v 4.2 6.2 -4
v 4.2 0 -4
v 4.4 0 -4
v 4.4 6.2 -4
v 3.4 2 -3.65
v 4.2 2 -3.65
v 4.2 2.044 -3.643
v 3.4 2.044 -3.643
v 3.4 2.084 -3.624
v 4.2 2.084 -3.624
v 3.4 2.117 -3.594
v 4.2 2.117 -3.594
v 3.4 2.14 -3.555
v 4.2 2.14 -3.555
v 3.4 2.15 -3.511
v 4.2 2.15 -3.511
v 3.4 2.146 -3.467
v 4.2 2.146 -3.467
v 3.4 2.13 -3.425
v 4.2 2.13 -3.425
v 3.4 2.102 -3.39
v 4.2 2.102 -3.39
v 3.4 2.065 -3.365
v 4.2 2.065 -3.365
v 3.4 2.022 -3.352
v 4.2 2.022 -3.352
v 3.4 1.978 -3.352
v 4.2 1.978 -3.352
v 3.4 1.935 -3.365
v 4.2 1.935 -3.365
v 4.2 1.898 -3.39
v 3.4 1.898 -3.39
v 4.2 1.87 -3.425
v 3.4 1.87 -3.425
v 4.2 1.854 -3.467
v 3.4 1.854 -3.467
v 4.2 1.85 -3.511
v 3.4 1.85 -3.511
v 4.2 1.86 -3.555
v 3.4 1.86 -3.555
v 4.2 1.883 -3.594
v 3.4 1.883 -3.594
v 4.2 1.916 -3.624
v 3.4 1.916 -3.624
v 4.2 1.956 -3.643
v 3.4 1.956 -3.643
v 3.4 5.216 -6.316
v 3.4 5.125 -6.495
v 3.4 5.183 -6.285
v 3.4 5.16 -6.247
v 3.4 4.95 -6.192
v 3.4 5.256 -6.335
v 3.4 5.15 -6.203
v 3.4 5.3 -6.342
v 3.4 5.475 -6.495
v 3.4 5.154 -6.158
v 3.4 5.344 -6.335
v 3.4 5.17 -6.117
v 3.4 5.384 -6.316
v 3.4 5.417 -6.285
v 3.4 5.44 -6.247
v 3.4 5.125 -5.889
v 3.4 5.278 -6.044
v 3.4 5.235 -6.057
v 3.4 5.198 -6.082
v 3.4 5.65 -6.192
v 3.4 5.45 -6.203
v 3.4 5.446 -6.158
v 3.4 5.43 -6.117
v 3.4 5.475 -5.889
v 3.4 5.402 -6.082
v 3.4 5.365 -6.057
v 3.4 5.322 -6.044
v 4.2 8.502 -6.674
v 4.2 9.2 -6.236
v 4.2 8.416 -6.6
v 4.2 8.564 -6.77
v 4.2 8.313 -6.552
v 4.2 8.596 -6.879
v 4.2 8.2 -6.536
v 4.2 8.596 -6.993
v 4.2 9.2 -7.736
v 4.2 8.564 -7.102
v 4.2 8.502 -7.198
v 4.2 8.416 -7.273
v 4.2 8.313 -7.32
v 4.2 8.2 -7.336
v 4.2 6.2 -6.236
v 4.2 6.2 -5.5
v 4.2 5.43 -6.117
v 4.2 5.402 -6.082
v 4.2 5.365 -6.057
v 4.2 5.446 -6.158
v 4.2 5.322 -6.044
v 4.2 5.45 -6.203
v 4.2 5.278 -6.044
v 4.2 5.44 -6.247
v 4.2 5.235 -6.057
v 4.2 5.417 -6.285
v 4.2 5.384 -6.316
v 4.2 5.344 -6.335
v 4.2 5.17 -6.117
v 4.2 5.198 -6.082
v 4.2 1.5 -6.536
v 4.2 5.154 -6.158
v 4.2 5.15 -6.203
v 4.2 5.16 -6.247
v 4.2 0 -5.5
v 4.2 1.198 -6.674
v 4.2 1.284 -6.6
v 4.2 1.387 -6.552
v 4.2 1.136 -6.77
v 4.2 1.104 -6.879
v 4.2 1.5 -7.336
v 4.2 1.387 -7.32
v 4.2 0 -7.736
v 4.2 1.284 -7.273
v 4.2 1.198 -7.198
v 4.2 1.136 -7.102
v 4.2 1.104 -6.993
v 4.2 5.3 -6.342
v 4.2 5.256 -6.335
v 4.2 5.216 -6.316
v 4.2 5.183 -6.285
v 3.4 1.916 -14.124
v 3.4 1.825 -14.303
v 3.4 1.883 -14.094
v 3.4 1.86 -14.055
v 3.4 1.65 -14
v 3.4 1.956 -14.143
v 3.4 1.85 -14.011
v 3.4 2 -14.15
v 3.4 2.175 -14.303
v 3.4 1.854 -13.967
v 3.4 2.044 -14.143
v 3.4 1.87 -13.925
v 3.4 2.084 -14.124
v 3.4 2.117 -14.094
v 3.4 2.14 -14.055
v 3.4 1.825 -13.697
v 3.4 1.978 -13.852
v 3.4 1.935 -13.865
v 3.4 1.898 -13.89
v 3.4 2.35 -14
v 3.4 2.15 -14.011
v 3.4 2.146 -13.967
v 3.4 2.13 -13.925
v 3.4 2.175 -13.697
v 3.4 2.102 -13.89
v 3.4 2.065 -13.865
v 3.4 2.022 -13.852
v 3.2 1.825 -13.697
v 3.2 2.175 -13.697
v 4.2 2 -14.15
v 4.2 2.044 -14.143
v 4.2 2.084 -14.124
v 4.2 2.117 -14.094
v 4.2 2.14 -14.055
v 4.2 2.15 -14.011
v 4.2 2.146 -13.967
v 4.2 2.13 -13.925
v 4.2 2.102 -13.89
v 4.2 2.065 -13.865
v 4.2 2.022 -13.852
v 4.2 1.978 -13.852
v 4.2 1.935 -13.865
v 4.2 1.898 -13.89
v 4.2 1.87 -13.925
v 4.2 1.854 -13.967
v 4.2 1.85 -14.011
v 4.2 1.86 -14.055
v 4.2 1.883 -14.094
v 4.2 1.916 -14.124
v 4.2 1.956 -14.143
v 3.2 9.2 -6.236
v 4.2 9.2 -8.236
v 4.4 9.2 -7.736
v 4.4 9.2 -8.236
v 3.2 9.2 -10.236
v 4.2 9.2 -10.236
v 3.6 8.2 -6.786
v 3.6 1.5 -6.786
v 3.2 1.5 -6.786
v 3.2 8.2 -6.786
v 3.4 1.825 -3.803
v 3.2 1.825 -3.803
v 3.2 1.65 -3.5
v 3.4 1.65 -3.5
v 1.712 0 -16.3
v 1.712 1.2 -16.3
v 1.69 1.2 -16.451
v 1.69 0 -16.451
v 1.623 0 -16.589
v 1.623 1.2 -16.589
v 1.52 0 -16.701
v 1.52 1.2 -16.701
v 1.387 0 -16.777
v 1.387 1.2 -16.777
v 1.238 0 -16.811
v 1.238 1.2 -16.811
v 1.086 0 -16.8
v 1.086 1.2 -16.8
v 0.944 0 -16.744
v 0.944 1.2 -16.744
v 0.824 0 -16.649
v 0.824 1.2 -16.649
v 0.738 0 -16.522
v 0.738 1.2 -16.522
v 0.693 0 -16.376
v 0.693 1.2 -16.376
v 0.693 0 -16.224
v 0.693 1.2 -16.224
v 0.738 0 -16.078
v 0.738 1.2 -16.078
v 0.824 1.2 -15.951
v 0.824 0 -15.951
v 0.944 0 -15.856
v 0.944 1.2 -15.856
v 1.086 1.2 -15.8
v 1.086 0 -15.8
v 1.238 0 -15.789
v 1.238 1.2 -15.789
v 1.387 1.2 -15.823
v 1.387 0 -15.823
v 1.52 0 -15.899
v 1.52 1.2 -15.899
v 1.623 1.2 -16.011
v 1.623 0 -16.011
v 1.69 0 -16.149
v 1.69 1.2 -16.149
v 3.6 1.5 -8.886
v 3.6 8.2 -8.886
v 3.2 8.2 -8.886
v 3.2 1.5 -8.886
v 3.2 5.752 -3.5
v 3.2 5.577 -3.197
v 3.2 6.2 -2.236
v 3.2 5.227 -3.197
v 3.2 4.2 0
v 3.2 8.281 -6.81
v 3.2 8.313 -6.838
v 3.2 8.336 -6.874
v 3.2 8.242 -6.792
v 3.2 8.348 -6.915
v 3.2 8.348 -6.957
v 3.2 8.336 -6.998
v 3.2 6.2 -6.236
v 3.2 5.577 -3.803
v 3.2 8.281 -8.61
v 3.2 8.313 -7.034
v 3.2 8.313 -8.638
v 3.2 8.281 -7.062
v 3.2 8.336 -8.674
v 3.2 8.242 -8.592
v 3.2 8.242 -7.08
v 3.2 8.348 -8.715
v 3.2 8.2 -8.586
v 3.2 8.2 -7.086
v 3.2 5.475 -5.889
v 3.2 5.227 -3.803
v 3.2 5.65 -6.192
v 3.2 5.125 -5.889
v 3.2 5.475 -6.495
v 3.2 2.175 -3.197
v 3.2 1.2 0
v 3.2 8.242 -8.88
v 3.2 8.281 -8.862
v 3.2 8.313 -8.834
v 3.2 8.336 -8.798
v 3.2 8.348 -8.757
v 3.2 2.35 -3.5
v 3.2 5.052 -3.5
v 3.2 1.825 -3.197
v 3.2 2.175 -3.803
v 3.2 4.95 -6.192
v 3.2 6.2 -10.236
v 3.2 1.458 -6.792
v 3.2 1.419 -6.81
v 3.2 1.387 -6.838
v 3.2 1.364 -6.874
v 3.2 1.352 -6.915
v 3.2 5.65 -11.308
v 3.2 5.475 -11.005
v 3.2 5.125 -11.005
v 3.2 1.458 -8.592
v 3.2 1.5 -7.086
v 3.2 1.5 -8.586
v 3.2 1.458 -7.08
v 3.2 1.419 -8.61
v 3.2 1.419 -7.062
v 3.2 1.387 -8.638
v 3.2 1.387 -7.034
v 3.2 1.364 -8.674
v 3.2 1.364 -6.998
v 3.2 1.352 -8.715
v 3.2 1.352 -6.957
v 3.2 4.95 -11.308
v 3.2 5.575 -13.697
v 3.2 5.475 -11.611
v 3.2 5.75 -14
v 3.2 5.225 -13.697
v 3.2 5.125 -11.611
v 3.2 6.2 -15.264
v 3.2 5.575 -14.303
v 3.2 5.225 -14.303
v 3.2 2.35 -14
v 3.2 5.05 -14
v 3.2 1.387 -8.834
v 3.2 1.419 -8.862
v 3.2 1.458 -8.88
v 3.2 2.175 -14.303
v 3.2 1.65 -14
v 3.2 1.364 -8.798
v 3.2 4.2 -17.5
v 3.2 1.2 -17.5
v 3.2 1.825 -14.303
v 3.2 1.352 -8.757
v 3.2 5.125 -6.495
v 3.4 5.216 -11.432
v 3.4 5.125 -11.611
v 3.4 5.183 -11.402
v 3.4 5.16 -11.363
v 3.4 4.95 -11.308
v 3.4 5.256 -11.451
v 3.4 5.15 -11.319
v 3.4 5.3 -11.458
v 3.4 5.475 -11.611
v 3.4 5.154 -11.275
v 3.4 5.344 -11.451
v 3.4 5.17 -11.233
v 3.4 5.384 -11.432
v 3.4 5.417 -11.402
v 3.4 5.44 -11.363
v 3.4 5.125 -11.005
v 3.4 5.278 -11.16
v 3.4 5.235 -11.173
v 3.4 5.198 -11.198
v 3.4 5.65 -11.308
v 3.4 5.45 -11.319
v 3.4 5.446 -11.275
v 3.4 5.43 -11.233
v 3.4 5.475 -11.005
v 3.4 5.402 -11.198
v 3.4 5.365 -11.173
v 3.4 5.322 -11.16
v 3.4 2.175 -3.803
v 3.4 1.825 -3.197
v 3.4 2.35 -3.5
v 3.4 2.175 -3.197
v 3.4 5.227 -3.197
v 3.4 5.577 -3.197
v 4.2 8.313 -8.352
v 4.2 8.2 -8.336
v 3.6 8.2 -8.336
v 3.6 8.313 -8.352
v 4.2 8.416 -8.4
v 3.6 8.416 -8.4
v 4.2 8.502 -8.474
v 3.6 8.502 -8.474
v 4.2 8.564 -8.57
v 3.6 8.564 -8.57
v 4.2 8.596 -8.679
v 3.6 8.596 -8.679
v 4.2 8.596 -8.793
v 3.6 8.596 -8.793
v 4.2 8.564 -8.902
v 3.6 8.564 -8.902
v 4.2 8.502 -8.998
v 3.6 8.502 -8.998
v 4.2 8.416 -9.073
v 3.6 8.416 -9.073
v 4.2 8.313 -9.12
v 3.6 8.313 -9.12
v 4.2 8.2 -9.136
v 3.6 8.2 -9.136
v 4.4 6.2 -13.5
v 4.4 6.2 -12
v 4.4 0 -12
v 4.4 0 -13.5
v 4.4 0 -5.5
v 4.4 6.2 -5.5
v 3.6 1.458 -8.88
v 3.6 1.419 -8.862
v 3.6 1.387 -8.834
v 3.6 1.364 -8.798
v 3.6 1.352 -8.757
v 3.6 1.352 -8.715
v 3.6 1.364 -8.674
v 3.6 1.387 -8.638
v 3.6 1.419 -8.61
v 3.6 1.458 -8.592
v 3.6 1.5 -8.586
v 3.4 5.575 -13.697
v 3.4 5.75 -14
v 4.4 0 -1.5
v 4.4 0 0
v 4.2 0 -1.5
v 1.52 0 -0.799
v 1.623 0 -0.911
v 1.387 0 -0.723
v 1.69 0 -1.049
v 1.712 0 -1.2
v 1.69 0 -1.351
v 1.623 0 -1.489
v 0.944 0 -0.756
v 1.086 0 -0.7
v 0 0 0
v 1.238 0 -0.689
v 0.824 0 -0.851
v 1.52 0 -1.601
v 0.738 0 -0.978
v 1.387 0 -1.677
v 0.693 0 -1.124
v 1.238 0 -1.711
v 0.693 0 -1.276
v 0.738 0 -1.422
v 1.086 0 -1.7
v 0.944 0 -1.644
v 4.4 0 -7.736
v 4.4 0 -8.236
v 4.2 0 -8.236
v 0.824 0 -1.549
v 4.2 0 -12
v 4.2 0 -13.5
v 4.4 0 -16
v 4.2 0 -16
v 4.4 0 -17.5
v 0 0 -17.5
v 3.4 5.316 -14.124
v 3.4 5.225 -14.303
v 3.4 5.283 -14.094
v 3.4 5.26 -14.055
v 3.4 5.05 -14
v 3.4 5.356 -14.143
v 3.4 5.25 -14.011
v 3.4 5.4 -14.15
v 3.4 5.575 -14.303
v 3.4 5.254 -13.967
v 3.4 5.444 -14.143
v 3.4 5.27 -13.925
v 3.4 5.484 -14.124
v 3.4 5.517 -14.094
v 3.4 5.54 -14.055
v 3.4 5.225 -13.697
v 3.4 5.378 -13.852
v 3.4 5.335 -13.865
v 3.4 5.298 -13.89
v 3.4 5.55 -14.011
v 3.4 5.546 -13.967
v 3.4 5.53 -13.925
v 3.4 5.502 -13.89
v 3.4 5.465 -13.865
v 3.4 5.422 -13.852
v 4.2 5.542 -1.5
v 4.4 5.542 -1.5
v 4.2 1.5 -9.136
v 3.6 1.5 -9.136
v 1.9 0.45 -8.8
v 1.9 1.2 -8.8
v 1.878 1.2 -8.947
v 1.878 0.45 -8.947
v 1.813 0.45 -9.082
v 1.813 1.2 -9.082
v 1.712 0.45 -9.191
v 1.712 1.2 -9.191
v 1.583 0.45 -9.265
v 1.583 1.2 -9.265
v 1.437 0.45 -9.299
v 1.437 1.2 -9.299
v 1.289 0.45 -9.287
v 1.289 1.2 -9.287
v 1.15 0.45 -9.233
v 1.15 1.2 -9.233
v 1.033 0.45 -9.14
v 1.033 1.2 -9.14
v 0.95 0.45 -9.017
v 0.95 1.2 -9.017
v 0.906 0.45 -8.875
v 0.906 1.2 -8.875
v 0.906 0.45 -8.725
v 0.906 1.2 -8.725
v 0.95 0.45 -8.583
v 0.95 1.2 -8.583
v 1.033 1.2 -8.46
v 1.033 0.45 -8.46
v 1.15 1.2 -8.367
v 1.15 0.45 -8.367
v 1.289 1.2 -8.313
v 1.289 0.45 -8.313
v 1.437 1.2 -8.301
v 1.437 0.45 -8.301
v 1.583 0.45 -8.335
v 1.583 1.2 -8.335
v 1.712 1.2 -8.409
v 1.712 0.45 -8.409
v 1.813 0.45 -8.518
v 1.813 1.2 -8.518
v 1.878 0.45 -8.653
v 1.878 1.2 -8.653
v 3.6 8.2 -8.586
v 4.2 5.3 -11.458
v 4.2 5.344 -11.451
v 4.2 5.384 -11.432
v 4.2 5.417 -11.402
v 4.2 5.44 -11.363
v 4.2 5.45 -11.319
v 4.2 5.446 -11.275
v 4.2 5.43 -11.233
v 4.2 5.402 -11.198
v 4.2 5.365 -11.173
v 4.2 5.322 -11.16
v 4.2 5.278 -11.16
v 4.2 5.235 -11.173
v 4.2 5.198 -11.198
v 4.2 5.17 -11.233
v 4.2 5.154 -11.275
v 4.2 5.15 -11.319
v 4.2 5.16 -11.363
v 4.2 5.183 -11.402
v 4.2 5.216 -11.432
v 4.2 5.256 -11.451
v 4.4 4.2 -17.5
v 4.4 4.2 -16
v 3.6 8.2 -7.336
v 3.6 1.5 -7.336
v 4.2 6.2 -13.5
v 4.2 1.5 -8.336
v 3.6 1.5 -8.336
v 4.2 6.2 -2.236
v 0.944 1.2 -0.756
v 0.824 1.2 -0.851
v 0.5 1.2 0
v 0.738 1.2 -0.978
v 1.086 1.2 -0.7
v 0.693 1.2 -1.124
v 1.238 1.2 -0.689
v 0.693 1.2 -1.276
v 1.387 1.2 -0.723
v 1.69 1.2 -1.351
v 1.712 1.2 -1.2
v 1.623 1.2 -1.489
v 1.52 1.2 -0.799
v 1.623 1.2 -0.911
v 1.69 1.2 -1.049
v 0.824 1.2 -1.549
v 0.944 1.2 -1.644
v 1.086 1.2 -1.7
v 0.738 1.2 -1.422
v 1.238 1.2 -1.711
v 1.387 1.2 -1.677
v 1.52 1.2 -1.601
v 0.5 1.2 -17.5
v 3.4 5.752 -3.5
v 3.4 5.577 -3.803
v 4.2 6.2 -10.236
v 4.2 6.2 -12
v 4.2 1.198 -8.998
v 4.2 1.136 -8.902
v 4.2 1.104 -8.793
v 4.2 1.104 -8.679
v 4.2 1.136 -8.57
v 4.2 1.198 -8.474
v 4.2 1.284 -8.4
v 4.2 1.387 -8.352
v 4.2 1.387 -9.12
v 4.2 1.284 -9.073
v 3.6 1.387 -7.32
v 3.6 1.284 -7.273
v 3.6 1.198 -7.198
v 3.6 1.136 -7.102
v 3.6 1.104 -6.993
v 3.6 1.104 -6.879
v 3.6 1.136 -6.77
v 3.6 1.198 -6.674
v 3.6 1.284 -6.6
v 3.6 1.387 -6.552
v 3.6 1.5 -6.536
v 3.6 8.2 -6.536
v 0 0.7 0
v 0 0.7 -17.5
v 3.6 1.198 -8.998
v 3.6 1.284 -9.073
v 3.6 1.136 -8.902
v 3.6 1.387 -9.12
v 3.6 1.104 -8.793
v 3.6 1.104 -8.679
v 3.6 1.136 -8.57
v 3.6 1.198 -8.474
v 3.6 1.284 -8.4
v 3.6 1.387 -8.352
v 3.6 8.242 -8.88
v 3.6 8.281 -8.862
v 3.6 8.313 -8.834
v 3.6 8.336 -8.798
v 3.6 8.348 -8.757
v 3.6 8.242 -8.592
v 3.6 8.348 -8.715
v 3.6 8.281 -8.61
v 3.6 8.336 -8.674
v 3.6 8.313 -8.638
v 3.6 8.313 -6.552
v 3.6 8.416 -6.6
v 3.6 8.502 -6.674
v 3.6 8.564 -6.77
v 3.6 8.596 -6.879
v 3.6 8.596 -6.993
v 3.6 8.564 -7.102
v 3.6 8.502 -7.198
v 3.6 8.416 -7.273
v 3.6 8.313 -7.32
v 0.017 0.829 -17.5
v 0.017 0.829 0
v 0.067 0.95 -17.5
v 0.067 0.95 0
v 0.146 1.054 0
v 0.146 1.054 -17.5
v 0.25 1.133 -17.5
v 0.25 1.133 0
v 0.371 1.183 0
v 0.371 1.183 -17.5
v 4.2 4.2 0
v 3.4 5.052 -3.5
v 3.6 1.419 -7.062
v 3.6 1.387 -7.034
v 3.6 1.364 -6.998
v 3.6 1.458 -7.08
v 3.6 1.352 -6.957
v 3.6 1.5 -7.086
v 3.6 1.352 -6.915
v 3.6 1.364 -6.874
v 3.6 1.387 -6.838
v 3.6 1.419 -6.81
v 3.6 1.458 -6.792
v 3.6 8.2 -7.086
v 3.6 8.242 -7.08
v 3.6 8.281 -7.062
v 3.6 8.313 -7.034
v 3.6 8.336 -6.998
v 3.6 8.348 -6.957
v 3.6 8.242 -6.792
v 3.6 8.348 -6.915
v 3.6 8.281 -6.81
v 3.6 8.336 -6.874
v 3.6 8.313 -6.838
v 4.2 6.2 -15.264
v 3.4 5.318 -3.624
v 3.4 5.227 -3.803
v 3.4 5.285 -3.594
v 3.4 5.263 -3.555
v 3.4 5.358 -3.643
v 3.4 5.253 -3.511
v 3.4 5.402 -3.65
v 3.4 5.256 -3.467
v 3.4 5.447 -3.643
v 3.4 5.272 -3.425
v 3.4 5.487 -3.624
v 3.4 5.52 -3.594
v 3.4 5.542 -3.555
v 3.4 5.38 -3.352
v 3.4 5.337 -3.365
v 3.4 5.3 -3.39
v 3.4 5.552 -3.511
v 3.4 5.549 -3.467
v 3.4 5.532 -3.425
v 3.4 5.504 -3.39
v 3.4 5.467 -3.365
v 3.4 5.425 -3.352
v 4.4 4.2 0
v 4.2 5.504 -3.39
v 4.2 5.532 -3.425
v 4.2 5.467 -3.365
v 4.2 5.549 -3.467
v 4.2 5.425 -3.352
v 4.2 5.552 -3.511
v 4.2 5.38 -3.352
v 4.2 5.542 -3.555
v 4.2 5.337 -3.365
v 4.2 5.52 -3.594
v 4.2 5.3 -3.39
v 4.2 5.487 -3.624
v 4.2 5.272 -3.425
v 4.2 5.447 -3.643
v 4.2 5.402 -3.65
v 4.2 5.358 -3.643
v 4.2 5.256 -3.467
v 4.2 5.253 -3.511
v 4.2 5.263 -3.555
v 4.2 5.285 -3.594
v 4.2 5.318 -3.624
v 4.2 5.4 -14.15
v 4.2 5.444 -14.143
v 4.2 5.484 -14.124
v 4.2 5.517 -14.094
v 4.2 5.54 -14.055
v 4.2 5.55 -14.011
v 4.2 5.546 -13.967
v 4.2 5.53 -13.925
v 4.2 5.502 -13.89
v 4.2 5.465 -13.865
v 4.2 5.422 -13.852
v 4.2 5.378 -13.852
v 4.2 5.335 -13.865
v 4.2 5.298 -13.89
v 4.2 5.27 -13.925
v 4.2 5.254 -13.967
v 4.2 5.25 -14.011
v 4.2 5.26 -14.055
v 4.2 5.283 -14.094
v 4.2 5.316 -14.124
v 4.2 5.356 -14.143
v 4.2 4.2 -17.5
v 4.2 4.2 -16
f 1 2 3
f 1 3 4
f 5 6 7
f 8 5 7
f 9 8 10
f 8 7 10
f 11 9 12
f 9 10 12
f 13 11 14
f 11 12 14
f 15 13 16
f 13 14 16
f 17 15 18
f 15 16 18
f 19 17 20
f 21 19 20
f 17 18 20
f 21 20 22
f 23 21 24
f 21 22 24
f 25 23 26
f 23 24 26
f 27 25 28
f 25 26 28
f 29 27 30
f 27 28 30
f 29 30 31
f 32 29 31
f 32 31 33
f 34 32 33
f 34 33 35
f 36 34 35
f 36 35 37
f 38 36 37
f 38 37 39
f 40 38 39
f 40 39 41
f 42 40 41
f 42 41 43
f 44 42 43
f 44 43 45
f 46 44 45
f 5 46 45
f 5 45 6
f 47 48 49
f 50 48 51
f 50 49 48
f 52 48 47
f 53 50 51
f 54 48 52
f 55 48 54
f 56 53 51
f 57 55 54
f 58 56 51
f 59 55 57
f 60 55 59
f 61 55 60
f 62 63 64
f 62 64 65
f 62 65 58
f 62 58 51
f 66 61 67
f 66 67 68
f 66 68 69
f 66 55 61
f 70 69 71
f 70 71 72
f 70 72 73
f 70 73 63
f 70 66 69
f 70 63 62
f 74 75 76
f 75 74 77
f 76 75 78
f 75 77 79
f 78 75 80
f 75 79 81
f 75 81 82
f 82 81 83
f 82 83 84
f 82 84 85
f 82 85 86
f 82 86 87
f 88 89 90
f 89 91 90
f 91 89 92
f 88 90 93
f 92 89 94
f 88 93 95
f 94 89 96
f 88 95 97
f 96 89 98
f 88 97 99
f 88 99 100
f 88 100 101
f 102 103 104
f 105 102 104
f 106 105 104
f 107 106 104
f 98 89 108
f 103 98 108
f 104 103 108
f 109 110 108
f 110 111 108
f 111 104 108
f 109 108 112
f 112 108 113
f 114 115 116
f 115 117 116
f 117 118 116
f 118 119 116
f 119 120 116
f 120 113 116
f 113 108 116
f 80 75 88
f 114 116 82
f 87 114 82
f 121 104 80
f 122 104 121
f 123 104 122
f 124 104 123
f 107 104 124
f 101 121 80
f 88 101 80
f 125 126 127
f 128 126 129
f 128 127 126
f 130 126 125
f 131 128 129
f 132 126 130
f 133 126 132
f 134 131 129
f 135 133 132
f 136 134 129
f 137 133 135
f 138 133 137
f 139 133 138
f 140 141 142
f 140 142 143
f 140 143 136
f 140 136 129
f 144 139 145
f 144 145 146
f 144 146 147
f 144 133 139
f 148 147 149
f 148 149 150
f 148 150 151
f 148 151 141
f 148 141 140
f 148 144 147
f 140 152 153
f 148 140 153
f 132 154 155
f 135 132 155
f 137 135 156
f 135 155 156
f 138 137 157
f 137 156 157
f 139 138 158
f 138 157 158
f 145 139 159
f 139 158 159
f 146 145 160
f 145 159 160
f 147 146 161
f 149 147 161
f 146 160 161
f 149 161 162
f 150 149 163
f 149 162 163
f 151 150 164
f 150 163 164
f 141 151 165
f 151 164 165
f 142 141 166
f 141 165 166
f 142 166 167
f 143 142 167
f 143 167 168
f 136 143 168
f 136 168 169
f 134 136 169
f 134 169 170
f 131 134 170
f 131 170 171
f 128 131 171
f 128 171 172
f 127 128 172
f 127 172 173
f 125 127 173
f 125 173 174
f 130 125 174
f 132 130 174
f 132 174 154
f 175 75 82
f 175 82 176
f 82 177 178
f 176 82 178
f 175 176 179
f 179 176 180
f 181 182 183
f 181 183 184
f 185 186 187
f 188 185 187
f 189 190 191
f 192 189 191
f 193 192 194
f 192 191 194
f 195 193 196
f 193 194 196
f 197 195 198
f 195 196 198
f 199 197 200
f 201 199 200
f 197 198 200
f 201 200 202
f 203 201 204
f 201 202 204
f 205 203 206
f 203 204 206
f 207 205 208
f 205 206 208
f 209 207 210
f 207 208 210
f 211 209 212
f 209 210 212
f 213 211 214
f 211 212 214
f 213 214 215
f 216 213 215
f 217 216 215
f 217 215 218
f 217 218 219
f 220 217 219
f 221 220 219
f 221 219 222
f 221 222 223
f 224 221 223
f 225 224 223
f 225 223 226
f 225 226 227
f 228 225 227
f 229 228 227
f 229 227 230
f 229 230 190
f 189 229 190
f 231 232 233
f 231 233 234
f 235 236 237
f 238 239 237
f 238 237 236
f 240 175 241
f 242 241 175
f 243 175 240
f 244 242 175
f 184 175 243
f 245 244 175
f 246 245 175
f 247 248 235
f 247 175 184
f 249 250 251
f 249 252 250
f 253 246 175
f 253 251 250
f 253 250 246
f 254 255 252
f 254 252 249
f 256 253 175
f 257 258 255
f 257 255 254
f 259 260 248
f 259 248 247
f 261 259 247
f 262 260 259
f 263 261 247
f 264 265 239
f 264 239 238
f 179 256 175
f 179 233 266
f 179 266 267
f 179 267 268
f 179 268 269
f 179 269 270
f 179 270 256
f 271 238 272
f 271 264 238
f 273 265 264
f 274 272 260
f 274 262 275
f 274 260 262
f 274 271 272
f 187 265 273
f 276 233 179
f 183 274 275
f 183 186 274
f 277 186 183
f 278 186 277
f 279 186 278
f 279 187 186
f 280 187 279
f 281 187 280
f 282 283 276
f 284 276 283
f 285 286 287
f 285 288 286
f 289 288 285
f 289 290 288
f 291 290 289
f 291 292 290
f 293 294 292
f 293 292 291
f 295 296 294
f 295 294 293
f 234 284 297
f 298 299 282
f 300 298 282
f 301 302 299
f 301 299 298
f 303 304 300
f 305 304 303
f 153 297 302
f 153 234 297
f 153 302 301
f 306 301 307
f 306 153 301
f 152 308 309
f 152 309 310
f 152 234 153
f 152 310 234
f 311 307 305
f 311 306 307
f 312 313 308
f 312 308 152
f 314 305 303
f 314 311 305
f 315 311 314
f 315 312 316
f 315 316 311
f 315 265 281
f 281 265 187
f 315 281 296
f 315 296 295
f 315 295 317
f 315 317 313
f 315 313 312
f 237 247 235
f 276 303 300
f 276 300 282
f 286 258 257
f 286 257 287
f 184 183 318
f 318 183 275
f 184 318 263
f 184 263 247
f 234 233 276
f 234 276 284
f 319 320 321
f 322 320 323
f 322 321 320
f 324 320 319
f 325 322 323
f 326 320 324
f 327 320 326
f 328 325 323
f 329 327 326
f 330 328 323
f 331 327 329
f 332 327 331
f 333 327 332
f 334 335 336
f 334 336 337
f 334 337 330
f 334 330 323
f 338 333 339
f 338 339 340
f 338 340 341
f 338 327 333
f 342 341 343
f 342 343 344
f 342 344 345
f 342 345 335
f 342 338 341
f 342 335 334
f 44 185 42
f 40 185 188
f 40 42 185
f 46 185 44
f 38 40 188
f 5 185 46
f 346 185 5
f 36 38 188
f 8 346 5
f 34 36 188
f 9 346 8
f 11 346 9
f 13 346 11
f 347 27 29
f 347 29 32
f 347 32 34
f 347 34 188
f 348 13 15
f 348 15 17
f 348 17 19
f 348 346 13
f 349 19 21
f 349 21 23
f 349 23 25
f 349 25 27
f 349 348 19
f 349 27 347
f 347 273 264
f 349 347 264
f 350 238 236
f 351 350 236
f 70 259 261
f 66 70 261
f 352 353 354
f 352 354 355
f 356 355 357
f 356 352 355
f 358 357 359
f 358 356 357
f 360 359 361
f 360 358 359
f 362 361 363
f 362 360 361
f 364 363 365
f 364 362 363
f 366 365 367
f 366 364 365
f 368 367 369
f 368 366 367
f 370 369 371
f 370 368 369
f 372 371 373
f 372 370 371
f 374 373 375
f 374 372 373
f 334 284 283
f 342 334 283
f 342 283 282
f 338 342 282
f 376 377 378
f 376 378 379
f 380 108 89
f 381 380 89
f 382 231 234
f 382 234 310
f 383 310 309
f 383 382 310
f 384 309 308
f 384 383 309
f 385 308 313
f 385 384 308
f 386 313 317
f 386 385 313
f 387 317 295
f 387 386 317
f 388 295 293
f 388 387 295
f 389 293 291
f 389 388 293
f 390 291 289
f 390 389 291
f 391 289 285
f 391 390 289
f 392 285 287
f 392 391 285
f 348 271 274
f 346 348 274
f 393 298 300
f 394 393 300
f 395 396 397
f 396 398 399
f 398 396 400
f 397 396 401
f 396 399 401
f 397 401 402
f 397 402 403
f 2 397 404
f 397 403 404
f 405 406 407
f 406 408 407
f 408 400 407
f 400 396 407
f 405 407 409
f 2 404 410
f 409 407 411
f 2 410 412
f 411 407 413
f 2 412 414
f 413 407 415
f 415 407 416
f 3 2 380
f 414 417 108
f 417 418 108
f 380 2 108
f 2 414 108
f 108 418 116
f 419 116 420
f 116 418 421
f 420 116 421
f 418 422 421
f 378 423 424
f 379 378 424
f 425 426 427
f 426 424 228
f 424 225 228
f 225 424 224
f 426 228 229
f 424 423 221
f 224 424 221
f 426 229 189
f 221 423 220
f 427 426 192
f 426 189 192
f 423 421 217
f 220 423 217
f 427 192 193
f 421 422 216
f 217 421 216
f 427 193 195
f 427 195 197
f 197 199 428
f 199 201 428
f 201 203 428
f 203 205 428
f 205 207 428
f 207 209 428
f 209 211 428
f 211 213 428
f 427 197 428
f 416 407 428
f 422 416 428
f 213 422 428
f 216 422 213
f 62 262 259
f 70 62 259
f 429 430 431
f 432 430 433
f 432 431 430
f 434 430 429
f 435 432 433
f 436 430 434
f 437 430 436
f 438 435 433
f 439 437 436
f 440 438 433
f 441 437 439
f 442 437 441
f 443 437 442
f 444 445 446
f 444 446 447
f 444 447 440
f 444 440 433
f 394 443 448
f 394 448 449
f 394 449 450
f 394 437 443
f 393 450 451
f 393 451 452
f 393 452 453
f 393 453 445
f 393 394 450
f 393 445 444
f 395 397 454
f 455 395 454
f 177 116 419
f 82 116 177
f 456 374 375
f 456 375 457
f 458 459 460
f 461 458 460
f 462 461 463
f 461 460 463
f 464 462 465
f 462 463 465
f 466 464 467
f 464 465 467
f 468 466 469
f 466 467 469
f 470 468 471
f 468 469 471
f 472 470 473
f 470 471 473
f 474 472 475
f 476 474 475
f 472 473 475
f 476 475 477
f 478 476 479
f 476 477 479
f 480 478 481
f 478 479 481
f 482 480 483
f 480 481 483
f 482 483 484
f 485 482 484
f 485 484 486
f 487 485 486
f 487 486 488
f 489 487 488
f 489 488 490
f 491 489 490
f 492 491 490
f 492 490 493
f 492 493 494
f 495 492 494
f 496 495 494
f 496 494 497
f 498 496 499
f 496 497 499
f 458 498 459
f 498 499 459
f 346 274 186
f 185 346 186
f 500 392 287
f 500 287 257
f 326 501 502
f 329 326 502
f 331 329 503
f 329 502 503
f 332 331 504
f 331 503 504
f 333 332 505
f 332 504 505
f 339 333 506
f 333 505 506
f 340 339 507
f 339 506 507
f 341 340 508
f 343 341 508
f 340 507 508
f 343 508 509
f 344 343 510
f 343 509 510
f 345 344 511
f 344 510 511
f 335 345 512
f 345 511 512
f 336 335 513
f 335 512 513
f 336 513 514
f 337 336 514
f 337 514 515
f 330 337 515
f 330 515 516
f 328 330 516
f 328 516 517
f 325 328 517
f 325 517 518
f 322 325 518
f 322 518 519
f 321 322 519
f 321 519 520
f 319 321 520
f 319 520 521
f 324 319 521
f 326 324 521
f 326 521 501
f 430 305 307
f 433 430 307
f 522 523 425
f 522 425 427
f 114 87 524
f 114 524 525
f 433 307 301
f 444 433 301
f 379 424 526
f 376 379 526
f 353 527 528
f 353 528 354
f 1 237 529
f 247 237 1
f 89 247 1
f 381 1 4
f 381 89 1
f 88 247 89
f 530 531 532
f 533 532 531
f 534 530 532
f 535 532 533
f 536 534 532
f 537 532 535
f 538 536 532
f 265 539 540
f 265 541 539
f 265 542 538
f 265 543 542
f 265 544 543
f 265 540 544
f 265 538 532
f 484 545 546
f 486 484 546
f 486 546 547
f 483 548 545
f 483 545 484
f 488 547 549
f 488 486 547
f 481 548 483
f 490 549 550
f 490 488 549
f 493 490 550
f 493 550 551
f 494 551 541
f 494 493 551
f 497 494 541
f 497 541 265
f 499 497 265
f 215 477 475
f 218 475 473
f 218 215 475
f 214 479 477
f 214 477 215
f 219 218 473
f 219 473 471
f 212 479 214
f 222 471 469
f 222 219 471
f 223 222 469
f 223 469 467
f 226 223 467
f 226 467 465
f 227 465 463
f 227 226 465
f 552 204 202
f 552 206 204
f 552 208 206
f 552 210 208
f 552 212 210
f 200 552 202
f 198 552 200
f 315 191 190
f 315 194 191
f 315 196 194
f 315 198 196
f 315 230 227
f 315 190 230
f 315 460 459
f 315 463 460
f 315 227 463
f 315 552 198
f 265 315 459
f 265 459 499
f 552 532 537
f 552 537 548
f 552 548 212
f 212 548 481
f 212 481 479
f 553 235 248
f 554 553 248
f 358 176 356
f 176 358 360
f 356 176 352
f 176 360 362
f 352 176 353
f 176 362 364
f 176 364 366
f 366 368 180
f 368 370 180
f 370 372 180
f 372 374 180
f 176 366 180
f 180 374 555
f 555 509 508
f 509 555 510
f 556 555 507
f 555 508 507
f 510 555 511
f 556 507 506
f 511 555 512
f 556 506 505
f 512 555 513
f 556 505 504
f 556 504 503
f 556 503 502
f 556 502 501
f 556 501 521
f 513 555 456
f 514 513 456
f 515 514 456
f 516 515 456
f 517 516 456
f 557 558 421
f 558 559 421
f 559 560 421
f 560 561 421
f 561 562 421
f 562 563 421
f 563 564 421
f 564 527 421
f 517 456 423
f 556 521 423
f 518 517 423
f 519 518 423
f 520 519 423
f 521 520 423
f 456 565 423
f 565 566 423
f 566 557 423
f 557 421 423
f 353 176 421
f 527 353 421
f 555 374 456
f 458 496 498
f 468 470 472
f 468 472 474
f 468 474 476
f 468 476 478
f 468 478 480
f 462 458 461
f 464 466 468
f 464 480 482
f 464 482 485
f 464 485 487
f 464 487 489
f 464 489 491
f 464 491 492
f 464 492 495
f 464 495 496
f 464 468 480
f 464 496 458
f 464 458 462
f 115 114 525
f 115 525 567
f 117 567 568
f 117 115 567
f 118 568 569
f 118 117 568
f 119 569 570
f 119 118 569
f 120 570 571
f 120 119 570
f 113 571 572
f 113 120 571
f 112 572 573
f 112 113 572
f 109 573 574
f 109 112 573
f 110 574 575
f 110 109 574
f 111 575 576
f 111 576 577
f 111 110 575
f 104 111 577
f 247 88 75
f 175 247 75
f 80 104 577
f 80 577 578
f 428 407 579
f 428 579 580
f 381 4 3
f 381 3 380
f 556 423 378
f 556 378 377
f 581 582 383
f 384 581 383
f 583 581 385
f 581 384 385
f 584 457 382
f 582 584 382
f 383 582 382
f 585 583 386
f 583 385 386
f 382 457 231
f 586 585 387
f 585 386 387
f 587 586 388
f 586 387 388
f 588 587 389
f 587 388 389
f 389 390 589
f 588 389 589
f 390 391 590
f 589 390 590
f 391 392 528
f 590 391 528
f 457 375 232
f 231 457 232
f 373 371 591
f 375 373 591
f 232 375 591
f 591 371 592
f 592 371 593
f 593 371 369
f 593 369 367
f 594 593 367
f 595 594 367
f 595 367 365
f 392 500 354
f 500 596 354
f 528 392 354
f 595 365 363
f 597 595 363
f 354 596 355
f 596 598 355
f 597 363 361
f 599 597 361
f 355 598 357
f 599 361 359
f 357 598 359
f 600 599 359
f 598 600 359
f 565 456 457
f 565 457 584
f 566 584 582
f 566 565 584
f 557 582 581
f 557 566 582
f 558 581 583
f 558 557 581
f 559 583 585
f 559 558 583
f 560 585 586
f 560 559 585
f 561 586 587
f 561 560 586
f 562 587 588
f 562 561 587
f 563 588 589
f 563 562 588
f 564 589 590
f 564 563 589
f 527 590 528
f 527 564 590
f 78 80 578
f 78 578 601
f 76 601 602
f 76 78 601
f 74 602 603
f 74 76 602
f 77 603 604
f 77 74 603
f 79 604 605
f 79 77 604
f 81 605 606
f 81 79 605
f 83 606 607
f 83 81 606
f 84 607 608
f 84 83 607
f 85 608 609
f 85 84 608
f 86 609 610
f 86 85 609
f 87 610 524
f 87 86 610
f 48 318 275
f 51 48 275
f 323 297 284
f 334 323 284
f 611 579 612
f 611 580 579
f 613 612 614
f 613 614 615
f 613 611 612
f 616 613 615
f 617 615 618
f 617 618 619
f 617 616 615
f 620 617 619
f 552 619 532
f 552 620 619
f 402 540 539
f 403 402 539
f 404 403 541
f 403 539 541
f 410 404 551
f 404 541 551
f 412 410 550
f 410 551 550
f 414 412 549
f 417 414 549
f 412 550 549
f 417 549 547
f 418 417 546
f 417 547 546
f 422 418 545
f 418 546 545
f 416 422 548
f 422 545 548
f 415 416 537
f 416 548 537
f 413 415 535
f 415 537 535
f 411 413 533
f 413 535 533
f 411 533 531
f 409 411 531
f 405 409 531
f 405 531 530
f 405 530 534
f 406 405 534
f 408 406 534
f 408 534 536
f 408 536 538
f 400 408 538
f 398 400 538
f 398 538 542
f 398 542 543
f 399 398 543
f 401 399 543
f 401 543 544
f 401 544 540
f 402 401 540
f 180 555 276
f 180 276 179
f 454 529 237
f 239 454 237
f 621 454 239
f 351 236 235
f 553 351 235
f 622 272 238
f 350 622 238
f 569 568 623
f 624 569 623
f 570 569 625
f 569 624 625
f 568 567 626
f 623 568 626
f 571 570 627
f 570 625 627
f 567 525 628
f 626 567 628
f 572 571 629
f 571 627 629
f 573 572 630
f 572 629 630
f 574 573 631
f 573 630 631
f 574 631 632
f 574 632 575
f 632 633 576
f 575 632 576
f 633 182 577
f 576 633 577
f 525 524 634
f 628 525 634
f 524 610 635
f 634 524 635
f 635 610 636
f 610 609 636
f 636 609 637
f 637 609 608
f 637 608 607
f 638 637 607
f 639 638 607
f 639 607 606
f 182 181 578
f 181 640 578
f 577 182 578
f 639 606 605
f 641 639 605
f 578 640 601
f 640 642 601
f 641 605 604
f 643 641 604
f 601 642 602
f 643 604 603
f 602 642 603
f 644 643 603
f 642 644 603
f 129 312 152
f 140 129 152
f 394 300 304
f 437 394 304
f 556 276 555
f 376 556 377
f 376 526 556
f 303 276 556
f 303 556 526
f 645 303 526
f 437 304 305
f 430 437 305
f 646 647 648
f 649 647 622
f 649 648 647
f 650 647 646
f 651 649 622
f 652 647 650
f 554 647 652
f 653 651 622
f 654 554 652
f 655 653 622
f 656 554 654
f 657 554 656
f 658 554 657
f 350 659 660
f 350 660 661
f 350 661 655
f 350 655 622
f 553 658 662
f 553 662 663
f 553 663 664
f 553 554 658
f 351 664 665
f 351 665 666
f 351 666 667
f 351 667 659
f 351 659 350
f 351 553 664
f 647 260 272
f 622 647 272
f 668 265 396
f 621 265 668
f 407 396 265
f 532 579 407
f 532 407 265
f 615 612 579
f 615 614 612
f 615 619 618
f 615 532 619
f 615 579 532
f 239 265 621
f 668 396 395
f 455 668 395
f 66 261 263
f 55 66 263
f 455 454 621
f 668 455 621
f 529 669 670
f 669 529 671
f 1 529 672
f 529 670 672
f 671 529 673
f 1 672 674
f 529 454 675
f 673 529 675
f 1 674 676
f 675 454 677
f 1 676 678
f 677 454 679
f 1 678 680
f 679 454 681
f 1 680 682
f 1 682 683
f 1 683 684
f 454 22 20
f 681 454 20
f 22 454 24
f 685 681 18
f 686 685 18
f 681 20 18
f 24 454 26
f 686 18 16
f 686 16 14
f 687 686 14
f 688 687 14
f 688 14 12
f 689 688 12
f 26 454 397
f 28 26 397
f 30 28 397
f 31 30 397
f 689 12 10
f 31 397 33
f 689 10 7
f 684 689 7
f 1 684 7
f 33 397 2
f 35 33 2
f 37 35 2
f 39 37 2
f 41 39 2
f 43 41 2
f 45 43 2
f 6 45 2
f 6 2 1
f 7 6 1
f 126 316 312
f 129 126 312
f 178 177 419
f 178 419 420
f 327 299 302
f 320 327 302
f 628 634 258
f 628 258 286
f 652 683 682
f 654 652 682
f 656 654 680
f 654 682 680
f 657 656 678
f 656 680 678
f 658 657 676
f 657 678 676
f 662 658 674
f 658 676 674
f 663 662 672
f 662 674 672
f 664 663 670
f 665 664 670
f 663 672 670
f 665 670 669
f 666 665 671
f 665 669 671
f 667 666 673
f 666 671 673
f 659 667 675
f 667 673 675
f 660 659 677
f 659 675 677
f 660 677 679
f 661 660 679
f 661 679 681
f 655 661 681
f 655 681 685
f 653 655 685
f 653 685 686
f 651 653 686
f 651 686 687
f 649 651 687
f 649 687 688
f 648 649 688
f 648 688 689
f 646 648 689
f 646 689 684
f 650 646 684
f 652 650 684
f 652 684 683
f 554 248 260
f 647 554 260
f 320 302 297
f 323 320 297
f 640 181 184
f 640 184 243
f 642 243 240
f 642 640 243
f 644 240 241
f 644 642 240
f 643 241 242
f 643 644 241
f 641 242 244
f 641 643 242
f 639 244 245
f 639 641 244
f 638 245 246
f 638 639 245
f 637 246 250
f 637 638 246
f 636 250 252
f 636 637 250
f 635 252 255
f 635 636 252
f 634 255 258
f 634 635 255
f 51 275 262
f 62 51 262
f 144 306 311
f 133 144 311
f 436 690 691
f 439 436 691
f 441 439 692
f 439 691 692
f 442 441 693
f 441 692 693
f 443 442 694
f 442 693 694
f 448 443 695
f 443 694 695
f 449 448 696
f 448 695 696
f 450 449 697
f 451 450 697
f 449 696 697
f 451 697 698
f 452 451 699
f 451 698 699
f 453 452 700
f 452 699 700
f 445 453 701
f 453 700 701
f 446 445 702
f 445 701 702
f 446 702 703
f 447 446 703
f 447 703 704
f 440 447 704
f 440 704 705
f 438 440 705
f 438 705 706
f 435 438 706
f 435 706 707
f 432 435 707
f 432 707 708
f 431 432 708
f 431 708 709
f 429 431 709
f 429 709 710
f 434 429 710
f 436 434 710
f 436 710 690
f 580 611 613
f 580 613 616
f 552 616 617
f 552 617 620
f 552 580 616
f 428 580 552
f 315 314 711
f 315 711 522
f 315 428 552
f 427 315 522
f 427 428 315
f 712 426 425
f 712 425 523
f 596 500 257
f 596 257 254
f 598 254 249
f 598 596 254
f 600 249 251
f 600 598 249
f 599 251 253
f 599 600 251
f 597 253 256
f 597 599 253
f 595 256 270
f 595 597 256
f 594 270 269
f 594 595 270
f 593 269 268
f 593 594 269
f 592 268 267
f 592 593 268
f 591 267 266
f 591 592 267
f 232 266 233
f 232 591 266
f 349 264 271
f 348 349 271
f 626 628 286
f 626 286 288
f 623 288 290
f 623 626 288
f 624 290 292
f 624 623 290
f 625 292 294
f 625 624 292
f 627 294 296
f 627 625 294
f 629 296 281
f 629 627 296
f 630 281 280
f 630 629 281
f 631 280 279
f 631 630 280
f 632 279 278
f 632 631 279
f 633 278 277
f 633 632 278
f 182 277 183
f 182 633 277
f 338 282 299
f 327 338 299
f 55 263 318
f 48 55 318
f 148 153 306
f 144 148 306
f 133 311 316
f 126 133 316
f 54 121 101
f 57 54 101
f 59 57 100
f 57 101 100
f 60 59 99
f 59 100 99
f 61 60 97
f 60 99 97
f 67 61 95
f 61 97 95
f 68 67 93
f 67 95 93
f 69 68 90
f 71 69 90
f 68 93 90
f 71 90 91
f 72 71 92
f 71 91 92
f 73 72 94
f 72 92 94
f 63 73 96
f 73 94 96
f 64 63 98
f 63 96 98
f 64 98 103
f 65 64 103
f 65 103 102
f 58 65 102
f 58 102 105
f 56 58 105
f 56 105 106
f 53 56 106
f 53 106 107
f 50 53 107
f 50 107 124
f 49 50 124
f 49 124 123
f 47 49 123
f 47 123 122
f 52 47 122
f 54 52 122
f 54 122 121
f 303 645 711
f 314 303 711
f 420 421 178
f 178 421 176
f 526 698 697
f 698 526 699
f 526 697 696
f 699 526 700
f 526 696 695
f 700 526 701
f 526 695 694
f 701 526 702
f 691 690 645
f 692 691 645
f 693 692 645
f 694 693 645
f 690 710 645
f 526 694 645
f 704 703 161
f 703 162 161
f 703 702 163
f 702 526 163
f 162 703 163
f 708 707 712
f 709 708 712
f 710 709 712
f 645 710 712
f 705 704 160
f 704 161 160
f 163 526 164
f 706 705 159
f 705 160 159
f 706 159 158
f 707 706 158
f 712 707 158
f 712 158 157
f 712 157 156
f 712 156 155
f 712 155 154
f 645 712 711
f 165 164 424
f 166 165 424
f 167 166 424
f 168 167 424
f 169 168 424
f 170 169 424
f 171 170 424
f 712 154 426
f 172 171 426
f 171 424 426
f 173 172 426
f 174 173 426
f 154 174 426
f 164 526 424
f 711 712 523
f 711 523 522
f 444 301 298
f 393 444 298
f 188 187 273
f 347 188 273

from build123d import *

# Parameters (mm, degrees)
SKETCH1_W               = 4.2
SKETCH1_H               = 17.5
BOSS_EXTRUDE1_DEPTH     = 1.2
SKETCH2_W               = 1
SKETCH2_H               = 17.5
BOSS_EXTRUDE2_DEPTH     = 5
CUT_EXTRUDE1_DEPTH      = 1.3
CUT_EXTRUDE1_DEPTH_BACK = 5
SKETCH4_W               = 4
SKETCH4_H               = 3
BOSS_EXTRUDE3_DEPTH     = 1
SKETCH5_R               = 0.5125
CUT_EXTRUDE2_DEPTH      = 2.2
SKETCH6_R               = 0.5
CUT_EXTRUDE3_DEPTH      = 0.75
SKETCH11_R              = 0.15
CUT_EXTRUDE5_DEPTH      = 1.3
CUT_EXTRUDE5_DEPTH_BACK = 5.2
CUT_EXTRUDE7_DEPTH      = 0.2
CUT_EXTRUDE6_DEPTH      = 1.3
CUT_EXTRUDE6_DEPTH_BACK = 1.3
SKETCH14_W              = 1.5
SKETCH14_H              = 4.2
SKETCH14_H_2            = 6.2
SKETCH14_W_2            = 0.5
SKETCH14_H_3            = 9.2
BOSS_EXTRUDE5_DEPTH     = 0.2
FILLET1_R               = 0.5
CUT_EXTRUDE8_DEPTH      = 0.6


with BuildPart() as part:
    # Sketch1 → Boss-Extrude1 (new body)
    with BuildSketch(Plane(origin=(0, 0, 0), x_dir=(1, 0, 0), z_dir=(0, 1, 0))):
        with Locations((2.1, 8.75)):
            Rectangle(SKETCH1_W, SKETCH1_H)
    extrude(amount=BOSS_EXTRUDE1_DEPTH)

    # Sketch2 → Boss-Extrude2 (add)
    with BuildSketch(Plane(origin=(0, 1.2, 0), x_dir=(1, 0, 0), z_dir=(0, 1, 0))):
        with Locations((3.7, 8.75)):
            Rectangle(SKETCH2_W, SKETCH2_H)
    extrude(amount=BOSS_EXTRUDE2_DEPTH)

    # Sketch3 → Cut-Extrude1 (cut, two sides)
    with BuildSketch(Plane(origin=(4.2, 0, 0), x_dir=(0, 0, -1), z_dir=(1, 0, 0))) as cut_extrude1_sk:
        Polygon((0, 4.2), (0, 6.2), (2.236067977, 6.2), align=None)
        Polygon((17.5, 6.2), (15.263932023, 6.2), (17.5, 4.2), align=None)
    extrude(amount=CUT_EXTRUDE1_DEPTH, mode=Mode.SUBTRACT)
    extrude(cut_extrude1_sk.sketch, amount=-CUT_EXTRUDE1_DEPTH_BACK, mode=Mode.SUBTRACT)

    # Sketch4 → Boss-Extrude3 (add)
    with BuildSketch(Plane(origin=(4.2, 0, 0), x_dir=(0, 0, -1), z_dir=(1, 0, 0))):
        with Locations((8.236067977, 7.7)):
            Rectangle(SKETCH4_W, SKETCH4_H)
    extrude(amount=-BOSS_EXTRUDE3_DEPTH)

    # Sketch5 → Cut-Extrude2 (cut, through all)
    with BuildSketch(Plane(origin=(0, 1.2, 0), x_dir=(1, 0, 0), z_dir=(0, 1, 0))):
        with Locations((1.2, 16.3)):
            Circle(SKETCH5_R)
        with Locations((1.2, 1.2)):
            Circle(SKETCH5_R)
    extrude(amount=-CUT_EXTRUDE2_DEPTH, mode=Mode.SUBTRACT)

    # Sketch6 → Cut-Extrude3 (cut)
    with BuildSketch(Plane(origin=(0, 1.2, 0), x_dir=(1, 0, 0), z_dir=(0, 1, 0))):
        with Locations((1.4, 8.8)):
            Circle(SKETCH6_R)
    extrude(amount=-CUT_EXTRUDE3_DEPTH, mode=Mode.SUBTRACT)

    # Sketch11 → Cut-Extrude5 (cut, two sides)
    with BuildSketch(Plane(origin=(4.2, 0, 0), x_dir=(0, 0, -1), z_dir=(1, 0, 0))) as cut_extrude5_sk:
        with Locations((3.5, 5.40229833)):
            Circle(SKETCH11_R)
        with Locations((6.191844332, 5.3)):
            Circle(SKETCH11_R)
        with Locations((3.5, 2)):
            Circle(SKETCH11_R)
        with Locations((11.308155668, 5.3)):
            Circle(SKETCH11_R)
        with Locations((14, 5.4)):
            Circle(SKETCH11_R)
        with Locations((14, 2)):
            Circle(SKETCH11_R)
    extrude(amount=CUT_EXTRUDE5_DEPTH, mode=Mode.SUBTRACT)
    extrude(cut_extrude5_sk.sketch, amount=-CUT_EXTRUDE5_DEPTH_BACK, mode=Mode.SUBTRACT)

    # Sketch15 → Cut-Extrude7 (cut)
    with BuildSketch(Plane.ZY.offset(-3.2)):
        Polygon((-14, 5.75), (-14.303108891, 5.575), (-14.303108891, 5.225), (-14, 5.05), (-13.696891109, 5.225), (-13.696891109, 5.575), align=None)
        Polygon((-11.308155668, 5.65), (-11.611264559, 5.475), (-11.611264559, 5.125), (-11.308155668, 4.95), (-11.005046777, 5.125), (-11.005046777, 5.475), align=None)
        Polygon((-14, 2.35), (-14.303108891, 2.175), (-14.303108891, 1.825), (-14, 1.65), (-13.696891109, 1.825), (-13.696891109, 2.175), align=None)
        Polygon((-6.191844332, 5.65), (-6.494953223, 5.475), (-6.494953223, 5.125), (-6.191844332, 4.95), (-5.888735441, 5.125), (-5.888735441, 5.475), align=None)
        Polygon((-3.5, 5.75229833), (-3.803108891, 5.57729833), (-3.803108891, 5.22729833), (-3.5, 5.05229833), (-3.196891109, 5.22729833), (-3.196891109, 5.57729833), align=None)
        Polygon((-3.5, 2.35), (-3.803108891, 2.175), (-3.803108891, 1.825), (-3.5, 1.65), (-3.196891109, 1.825), (-3.196891109, 2.175), align=None)
    extrude(amount=-CUT_EXTRUDE7_DEPTH, mode=Mode.SUBTRACT)

    # Sketch12 → Cut-Extrude6 (cut, two sides)
    with BuildSketch(Plane(origin=(4.2, 0, 0), x_dir=(0, 0, -1), z_dir=(1, 0, 0))) as cut_extrude6_sk:
        with BuildLine():
            Line((8.886067977, 8.2), (8.886067977, 1.5))
            ThreePointArc((8.886067977, 1.5), (8.736067977, 1.35), (8.586067977, 1.5))
            Line((8.586067977, 1.5), (8.586067977, 8.2))
            ThreePointArc((8.586067977, 8.2), (8.736067977, 8.35), (8.886067977, 8.2))
        make_face()
        with BuildLine():
            Line((7.086067977, 8.2), (7.086067977, 1.5))
            ThreePointArc((7.086067977, 1.5), (6.936067977, 1.35), (6.786067977, 1.5))
            Line((6.786067977, 1.5), (6.786067977, 8.2))
            ThreePointArc((6.786067977, 8.2), (6.936067977, 8.35), (7.086067977, 8.2))
        make_face()
    extrude(amount=CUT_EXTRUDE6_DEPTH, mode=Mode.SUBTRACT)
    extrude(cut_extrude6_sk.sketch, amount=-CUT_EXTRUDE6_DEPTH_BACK, mode=Mode.SUBTRACT)

    # Sketch14 → Boss-Extrude5 (add)
    with BuildSketch(Plane(origin=(4.2, 0, 0), x_dir=(0, 0, -1), z_dir=(1, 0, 0))):
        with Locations((0.75, 2.1)):
            Rectangle(SKETCH14_W, SKETCH14_H)
        Polygon((1.5, 4.2), (1.5, 5.541640786), (0, 4.2), align=None)
        with Locations((4.75, 3.1)):
            Rectangle(SKETCH14_W, SKETCH14_H_2)
        with Locations((12.75, 3.1)):
            Rectangle(SKETCH14_W, SKETCH14_H_2)
        with Locations((7.986067977, 4.6)):
            Rectangle(SKETCH14_W_2, SKETCH14_H_3)
        with Locations((16.75, 2.1)):
            Rectangle(SKETCH14_W, SKETCH14_H)
    extrude(amount=BOSS_EXTRUDE5_DEPTH)

    # Fillet1
    fillet1_edges = [part.edges().sort_by_distance(p)[0] for p in [
        (0, 1.2, -8.75),
    ]]
    fillet(fillet1_edges, radius=FILLET1_R)

    # Sketch16 → Cut-Extrude8 (cut)
    with BuildSketch(Plane(origin=(4.2, 0, 0), x_dir=(0, 0, -1), z_dir=(1, 0, 0))):
        with BuildLine():
            Line((8.336067977, 1.5), (8.336067977, 8.2))
            ThreePointArc((8.336067977, 8.2), (8.736067977, 8.6), (9.136067977, 8.2))
            Line((9.136067977, 8.2), (9.136067977, 1.5))
            ThreePointArc((9.136067977, 1.5), (8.736067977, 1.1), (8.336067977, 1.5))
        make_face()
        with BuildLine():
            Line((6.536067977, 1.5), (6.536067977, 8.2))
            ThreePointArc((6.536067977, 8.2), (6.936067977, 8.6), (7.336067977, 8.2))
            Line((7.336067977, 8.2), (7.336067977, 1.5))
            ThreePointArc((7.336067977, 1.5), (6.936067977, 1.1), (6.536067977, 1.5))
        make_face()
    extrude(amount=-CUT_EXTRUDE8_DEPTH, mode=Mode.SUBTRACT)


solid = part.part
